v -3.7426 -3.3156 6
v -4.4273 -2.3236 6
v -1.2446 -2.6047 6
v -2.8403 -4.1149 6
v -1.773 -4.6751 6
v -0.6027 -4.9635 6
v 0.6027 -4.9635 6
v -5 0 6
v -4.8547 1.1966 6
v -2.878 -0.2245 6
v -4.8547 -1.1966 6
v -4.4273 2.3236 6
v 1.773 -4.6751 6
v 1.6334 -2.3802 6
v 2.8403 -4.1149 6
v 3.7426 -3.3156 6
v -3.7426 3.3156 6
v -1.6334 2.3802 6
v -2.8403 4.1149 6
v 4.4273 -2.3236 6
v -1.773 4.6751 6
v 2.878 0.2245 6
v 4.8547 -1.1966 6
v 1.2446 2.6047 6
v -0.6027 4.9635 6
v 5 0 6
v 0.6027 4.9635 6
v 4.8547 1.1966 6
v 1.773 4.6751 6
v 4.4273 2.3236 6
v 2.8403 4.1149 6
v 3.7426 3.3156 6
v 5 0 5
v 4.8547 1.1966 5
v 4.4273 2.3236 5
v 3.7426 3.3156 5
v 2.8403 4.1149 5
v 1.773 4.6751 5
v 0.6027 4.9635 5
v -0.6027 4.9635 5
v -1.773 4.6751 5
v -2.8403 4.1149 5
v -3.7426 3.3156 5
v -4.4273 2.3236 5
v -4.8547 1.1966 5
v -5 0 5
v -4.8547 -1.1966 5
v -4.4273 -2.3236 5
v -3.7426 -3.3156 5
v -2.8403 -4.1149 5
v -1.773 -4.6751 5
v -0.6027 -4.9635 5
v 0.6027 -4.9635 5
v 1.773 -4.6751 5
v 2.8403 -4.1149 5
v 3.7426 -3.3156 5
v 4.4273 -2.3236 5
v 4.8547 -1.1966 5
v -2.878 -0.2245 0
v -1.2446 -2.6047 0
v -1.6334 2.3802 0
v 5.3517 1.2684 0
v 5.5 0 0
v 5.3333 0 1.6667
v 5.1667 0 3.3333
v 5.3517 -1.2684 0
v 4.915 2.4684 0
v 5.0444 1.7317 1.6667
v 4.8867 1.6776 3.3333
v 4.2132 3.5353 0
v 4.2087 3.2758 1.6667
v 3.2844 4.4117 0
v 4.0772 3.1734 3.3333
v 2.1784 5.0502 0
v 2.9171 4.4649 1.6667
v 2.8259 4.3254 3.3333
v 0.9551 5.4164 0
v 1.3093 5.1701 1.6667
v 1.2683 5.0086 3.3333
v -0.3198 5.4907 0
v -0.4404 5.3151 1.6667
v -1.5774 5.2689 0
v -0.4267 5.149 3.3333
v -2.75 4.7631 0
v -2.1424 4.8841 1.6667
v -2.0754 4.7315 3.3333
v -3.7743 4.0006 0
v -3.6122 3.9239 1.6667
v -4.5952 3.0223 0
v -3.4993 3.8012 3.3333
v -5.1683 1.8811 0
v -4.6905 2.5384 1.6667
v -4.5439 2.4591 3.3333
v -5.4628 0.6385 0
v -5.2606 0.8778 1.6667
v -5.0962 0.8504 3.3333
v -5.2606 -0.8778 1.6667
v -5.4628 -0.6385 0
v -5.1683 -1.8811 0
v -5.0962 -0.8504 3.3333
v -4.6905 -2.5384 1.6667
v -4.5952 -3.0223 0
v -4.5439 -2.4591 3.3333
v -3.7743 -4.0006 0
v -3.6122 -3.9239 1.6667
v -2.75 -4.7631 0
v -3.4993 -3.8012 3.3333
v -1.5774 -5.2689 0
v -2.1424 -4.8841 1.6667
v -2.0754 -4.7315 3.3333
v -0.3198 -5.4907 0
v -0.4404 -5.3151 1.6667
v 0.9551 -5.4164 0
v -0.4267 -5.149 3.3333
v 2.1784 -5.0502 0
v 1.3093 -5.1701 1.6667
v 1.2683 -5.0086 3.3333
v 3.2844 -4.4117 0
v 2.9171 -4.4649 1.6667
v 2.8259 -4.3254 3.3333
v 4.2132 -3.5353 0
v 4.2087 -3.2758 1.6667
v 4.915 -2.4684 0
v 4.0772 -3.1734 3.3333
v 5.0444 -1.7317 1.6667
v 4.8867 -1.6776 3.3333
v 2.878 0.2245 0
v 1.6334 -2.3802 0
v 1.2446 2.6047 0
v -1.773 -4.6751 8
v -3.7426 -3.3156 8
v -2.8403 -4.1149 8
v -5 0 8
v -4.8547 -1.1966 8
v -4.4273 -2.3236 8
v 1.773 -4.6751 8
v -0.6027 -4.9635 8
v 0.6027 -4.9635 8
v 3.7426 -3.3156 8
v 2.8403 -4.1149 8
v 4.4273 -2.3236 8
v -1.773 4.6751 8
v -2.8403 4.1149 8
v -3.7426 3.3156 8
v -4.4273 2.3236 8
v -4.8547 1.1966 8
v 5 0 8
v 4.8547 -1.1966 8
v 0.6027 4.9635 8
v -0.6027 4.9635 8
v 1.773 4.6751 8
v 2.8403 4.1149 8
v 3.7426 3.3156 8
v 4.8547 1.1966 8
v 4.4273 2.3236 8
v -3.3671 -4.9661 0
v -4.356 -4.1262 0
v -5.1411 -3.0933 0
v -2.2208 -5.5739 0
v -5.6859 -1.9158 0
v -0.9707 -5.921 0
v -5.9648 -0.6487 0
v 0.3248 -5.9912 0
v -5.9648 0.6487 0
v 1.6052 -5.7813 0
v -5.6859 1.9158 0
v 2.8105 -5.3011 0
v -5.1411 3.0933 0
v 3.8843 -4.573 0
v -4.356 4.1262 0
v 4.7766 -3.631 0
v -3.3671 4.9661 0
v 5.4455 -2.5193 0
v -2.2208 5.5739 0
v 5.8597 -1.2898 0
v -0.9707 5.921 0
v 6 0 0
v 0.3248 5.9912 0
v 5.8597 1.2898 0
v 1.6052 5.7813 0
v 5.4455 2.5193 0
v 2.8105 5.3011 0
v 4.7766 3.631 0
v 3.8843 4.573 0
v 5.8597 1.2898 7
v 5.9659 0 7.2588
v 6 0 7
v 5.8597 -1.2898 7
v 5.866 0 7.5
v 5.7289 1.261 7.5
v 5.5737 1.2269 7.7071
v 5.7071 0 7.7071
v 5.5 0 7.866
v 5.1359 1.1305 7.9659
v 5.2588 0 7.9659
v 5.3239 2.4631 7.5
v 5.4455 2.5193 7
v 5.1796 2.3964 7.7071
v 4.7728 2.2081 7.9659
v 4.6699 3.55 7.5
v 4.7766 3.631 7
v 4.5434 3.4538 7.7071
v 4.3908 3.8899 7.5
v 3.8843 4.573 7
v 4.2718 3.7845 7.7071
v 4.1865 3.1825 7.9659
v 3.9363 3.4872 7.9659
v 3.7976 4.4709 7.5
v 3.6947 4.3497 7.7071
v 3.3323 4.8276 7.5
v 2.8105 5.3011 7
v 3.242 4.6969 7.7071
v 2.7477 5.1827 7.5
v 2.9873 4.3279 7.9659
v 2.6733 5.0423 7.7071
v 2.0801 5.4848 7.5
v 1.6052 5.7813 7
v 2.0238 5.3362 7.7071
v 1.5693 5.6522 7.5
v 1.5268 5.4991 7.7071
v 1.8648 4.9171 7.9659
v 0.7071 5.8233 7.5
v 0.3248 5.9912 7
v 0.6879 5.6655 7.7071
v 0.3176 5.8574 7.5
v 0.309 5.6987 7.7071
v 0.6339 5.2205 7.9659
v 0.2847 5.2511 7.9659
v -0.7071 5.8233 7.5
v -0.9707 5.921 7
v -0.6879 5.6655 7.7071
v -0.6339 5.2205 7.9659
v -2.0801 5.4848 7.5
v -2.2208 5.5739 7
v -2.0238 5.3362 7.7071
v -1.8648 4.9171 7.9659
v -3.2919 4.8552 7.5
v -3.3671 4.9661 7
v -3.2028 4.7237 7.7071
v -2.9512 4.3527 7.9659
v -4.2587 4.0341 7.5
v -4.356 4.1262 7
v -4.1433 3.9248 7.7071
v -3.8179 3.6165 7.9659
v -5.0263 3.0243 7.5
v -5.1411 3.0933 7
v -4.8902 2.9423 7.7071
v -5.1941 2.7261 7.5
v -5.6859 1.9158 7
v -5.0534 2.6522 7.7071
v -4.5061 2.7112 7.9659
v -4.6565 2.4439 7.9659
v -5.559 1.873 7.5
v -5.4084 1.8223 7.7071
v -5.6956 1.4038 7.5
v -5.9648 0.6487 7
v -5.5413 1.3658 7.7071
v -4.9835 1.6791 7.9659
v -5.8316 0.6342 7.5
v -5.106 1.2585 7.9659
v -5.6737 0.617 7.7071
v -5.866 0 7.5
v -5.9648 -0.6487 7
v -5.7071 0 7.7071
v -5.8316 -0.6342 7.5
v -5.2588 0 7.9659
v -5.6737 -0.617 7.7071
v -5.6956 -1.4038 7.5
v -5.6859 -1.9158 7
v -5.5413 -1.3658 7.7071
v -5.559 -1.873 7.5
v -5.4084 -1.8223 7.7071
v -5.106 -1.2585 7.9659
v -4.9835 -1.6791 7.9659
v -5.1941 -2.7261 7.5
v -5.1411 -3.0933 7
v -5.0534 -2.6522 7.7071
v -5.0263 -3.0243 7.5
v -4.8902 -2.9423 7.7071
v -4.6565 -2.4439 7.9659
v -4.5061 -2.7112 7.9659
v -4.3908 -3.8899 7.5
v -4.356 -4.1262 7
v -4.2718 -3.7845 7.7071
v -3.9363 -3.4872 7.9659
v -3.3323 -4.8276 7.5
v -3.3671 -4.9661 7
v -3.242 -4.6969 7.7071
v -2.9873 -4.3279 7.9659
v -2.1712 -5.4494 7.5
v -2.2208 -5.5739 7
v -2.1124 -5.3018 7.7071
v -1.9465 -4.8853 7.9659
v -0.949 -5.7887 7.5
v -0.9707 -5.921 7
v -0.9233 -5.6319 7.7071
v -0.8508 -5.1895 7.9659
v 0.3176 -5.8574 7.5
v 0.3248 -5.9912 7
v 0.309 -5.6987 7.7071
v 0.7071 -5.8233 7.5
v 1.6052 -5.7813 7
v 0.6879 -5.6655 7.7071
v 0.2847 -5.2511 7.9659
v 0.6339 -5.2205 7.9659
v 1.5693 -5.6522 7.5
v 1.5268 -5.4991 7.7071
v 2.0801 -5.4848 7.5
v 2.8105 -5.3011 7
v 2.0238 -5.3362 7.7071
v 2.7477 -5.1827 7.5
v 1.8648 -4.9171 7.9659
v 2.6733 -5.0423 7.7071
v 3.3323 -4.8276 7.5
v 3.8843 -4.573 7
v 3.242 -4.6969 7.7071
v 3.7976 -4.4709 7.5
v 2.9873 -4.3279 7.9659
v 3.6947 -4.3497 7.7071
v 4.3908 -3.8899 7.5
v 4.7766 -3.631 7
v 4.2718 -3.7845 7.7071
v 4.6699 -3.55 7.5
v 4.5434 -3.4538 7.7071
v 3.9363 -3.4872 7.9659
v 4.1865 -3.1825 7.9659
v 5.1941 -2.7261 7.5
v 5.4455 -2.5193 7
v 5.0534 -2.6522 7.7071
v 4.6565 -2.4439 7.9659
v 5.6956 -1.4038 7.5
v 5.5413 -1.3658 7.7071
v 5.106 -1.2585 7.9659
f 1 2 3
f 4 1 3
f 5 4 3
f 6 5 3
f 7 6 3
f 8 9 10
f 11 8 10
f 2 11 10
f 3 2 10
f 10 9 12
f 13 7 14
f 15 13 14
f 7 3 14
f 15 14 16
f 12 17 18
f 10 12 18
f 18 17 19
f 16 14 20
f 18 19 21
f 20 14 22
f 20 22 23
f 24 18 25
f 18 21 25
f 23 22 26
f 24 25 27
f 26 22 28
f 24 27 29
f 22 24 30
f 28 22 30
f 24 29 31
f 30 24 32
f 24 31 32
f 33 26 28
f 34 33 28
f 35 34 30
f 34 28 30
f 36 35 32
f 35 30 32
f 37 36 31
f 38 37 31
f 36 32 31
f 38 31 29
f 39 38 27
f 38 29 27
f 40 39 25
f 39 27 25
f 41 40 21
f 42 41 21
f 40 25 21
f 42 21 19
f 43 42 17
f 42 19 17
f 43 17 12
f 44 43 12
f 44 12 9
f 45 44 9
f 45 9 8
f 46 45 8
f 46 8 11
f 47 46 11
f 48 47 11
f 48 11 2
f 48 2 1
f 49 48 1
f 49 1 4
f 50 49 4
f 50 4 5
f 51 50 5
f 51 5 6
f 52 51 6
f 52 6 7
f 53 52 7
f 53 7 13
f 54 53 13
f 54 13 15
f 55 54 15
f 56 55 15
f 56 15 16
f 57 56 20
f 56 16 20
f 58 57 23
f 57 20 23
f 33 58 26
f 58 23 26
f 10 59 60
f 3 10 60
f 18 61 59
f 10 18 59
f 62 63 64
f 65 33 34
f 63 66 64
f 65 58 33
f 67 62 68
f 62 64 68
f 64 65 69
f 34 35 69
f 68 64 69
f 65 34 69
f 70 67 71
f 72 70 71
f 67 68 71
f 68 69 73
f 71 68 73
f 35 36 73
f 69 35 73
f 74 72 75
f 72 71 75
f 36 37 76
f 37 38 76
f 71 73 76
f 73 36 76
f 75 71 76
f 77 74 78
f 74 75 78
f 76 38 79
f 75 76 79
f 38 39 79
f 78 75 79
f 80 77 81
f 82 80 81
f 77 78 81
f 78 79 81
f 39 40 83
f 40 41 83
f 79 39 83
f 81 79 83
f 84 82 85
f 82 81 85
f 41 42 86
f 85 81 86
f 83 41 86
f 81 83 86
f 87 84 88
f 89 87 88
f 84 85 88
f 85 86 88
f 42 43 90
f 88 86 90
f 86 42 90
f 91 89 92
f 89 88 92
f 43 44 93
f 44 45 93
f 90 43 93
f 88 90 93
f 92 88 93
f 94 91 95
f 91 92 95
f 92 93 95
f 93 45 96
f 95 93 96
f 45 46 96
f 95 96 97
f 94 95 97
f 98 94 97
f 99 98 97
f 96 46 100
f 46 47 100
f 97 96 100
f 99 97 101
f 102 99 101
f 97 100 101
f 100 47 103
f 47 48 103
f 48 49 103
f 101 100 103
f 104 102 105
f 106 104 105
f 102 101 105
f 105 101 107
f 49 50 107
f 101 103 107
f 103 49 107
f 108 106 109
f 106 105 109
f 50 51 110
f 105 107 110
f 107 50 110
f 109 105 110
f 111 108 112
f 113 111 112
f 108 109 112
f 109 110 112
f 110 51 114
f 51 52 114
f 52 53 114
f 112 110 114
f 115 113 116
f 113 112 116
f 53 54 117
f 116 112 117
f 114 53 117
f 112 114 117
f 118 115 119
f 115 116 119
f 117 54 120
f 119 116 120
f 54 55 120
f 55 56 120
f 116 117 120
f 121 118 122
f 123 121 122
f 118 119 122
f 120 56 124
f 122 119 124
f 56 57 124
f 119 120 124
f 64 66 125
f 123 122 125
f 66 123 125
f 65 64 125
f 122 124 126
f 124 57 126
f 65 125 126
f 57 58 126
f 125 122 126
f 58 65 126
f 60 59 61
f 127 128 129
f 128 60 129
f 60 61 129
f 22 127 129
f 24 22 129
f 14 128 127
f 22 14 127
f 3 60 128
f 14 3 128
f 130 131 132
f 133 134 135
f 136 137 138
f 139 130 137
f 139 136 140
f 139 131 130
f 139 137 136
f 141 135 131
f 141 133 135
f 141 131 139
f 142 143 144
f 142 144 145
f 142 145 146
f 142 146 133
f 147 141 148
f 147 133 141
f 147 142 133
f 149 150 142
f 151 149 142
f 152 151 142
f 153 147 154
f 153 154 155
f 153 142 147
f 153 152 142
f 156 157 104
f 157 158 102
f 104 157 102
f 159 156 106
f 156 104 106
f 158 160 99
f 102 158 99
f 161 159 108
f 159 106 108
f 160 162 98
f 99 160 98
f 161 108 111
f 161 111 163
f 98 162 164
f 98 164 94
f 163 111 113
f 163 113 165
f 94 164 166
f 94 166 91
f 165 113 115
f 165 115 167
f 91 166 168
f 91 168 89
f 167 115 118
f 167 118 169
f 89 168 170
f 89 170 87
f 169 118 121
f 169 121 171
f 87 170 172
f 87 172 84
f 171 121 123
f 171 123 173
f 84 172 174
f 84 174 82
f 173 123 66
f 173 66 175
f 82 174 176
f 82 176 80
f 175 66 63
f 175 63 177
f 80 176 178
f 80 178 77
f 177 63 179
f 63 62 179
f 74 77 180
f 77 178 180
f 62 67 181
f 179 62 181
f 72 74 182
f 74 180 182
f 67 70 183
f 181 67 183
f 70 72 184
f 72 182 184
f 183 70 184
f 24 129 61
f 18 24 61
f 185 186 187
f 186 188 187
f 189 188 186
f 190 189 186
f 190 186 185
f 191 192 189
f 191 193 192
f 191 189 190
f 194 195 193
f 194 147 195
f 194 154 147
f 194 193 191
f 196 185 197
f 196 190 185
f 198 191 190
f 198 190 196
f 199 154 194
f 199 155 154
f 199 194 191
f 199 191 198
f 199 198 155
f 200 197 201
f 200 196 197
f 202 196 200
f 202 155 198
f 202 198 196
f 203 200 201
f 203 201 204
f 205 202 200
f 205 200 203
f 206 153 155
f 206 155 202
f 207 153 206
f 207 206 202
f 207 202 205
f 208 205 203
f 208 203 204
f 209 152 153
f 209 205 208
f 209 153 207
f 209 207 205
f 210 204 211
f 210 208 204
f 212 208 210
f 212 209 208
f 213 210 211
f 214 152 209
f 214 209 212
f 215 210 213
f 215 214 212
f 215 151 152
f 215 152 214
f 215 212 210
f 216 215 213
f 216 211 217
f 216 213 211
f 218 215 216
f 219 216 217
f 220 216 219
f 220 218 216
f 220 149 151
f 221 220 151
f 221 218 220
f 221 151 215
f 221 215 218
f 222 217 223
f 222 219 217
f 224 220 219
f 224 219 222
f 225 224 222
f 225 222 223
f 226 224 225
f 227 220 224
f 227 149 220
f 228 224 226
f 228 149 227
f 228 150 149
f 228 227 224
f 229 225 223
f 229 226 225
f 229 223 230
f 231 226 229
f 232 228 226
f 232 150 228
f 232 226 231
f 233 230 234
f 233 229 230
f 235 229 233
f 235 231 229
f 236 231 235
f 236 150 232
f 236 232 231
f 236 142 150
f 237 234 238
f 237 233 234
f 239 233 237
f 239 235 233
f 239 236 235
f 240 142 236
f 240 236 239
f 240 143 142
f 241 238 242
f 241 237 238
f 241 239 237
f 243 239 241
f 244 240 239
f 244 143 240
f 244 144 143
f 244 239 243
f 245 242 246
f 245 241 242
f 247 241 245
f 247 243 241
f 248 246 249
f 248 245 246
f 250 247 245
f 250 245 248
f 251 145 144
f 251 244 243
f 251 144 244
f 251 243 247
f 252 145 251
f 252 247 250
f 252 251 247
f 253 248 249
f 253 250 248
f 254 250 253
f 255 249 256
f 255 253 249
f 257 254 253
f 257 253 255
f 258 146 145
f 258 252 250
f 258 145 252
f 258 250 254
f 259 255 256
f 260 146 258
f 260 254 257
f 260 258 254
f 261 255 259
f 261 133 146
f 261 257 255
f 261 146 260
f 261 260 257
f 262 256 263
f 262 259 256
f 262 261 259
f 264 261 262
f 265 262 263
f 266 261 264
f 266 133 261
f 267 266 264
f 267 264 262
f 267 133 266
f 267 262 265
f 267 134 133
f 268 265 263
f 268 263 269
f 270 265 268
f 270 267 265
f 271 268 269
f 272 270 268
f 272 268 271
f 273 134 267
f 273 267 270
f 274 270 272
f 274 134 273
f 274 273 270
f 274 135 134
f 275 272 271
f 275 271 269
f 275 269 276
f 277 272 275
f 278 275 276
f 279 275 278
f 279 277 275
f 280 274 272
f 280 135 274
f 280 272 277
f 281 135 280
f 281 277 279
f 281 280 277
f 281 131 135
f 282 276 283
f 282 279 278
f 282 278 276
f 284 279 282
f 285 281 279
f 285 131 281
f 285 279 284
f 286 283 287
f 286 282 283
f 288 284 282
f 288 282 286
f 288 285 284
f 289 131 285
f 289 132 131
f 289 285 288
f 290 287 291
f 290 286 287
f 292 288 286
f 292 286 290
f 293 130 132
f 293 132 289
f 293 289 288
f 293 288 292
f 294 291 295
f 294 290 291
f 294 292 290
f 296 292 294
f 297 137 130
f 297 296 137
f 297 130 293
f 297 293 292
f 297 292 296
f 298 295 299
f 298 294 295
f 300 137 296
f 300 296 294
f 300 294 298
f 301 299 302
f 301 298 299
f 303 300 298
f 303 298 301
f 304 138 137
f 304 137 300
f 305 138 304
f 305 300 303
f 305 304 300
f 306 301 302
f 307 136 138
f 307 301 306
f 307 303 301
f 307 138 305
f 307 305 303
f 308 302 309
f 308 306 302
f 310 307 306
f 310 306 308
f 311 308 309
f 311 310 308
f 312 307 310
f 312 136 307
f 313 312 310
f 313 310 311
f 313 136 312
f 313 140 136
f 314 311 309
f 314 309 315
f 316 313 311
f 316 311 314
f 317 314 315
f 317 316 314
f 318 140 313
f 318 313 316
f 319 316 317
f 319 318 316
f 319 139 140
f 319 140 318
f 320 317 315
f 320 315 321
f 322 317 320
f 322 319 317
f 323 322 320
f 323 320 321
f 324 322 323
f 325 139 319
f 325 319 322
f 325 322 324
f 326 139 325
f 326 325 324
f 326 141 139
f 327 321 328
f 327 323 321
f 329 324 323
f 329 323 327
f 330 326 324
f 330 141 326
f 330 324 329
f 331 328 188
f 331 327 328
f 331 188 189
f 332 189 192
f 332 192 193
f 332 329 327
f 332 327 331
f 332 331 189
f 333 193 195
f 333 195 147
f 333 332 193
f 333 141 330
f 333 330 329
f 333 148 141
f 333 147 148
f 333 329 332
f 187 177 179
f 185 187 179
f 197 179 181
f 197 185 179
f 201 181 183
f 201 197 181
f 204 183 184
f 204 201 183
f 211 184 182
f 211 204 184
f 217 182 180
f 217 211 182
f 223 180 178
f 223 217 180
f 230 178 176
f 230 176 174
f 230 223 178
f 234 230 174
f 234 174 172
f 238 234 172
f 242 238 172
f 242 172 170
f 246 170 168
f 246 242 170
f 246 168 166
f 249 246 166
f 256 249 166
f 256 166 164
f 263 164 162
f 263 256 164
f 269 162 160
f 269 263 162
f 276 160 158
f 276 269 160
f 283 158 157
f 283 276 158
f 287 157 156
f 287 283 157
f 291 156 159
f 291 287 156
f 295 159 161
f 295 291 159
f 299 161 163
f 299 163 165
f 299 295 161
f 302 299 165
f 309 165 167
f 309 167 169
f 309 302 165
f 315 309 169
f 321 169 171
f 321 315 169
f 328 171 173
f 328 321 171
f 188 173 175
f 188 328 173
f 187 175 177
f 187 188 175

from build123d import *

# Parameters (mm, degrees)
F1_DEPTH = 6
F2_R     = 5
F3_DEPTH = 2
F4_R     = 6
F4_R_2   = 5
F5_DEPTH = 8
F6_R     = 1
F7_SIZE2 = 5
F7_SIZE  = 0.5


with BuildPart() as f1:
    # F0 (on Top) → F1 (new body)
    with BuildSketch(Plane.XY):
        Polygon((1.6334467892, -2.3801648935), (2.8780066576, 0.2245239684), (1.2445598684, 2.6046888619), (-1.6334467892, 2.3801648935), (-2.8780066576, -0.2245239684), (-1.2445598684, -2.6046888619), align=None)
    extrude(amount=F1_DEPTH)

    # F2 (on face) → F3 (join)
    with BuildSketch(Plane.XY.offset(6)):
        Circle(F2_R)
        Polygon((-1.2445598684, -2.6046888619), (-2.8780066576, -0.2245239684), (-1.6334467892, 2.3801648935), (1.2445598684, 2.6046888619), (2.8780066576, 0.2245239684), (1.6334467892, -2.3801648935), align=None, mode=Mode.SUBTRACT)
        Polygon((-1.6334467892, 2.3801648935), (-2.8780066576, -0.2245239684), (-1.2445598684, -2.6046888619), (1.6334467892, -2.3801648935), (2.8780066576, 0.2245239684), (1.2445598684, 2.6046888619), align=None)
    extrude(amount=F3_DEPTH)

    # F4 (on face) → F5 (join)
    with BuildSketch(Plane.XY.offset(8)):
        Circle(F4_R)
        Circle(F4_R_2, mode=Mode.SUBTRACT)
    extrude(amount=-F5_DEPTH)

    # F6
    f6_edges = [f1.edges().sort_by_distance(p)[0] for p in [
        (-6, 0, 8),
    ]]
    fillet(f6_edges, radius=F6_R)

    # F7
    f7_edges = [f1.edges().sort_by_distance(p)[0] for p in [
        (-5, 0, 0),
    ]]
    f7_side = f1.faces().sort_by_distance((-5.830294, 0, 0))[0]
    chamfer(f7_edges, length=F7_SIZE, length2=F7_SIZE2, reference=f7_side)


solid = f1.part
